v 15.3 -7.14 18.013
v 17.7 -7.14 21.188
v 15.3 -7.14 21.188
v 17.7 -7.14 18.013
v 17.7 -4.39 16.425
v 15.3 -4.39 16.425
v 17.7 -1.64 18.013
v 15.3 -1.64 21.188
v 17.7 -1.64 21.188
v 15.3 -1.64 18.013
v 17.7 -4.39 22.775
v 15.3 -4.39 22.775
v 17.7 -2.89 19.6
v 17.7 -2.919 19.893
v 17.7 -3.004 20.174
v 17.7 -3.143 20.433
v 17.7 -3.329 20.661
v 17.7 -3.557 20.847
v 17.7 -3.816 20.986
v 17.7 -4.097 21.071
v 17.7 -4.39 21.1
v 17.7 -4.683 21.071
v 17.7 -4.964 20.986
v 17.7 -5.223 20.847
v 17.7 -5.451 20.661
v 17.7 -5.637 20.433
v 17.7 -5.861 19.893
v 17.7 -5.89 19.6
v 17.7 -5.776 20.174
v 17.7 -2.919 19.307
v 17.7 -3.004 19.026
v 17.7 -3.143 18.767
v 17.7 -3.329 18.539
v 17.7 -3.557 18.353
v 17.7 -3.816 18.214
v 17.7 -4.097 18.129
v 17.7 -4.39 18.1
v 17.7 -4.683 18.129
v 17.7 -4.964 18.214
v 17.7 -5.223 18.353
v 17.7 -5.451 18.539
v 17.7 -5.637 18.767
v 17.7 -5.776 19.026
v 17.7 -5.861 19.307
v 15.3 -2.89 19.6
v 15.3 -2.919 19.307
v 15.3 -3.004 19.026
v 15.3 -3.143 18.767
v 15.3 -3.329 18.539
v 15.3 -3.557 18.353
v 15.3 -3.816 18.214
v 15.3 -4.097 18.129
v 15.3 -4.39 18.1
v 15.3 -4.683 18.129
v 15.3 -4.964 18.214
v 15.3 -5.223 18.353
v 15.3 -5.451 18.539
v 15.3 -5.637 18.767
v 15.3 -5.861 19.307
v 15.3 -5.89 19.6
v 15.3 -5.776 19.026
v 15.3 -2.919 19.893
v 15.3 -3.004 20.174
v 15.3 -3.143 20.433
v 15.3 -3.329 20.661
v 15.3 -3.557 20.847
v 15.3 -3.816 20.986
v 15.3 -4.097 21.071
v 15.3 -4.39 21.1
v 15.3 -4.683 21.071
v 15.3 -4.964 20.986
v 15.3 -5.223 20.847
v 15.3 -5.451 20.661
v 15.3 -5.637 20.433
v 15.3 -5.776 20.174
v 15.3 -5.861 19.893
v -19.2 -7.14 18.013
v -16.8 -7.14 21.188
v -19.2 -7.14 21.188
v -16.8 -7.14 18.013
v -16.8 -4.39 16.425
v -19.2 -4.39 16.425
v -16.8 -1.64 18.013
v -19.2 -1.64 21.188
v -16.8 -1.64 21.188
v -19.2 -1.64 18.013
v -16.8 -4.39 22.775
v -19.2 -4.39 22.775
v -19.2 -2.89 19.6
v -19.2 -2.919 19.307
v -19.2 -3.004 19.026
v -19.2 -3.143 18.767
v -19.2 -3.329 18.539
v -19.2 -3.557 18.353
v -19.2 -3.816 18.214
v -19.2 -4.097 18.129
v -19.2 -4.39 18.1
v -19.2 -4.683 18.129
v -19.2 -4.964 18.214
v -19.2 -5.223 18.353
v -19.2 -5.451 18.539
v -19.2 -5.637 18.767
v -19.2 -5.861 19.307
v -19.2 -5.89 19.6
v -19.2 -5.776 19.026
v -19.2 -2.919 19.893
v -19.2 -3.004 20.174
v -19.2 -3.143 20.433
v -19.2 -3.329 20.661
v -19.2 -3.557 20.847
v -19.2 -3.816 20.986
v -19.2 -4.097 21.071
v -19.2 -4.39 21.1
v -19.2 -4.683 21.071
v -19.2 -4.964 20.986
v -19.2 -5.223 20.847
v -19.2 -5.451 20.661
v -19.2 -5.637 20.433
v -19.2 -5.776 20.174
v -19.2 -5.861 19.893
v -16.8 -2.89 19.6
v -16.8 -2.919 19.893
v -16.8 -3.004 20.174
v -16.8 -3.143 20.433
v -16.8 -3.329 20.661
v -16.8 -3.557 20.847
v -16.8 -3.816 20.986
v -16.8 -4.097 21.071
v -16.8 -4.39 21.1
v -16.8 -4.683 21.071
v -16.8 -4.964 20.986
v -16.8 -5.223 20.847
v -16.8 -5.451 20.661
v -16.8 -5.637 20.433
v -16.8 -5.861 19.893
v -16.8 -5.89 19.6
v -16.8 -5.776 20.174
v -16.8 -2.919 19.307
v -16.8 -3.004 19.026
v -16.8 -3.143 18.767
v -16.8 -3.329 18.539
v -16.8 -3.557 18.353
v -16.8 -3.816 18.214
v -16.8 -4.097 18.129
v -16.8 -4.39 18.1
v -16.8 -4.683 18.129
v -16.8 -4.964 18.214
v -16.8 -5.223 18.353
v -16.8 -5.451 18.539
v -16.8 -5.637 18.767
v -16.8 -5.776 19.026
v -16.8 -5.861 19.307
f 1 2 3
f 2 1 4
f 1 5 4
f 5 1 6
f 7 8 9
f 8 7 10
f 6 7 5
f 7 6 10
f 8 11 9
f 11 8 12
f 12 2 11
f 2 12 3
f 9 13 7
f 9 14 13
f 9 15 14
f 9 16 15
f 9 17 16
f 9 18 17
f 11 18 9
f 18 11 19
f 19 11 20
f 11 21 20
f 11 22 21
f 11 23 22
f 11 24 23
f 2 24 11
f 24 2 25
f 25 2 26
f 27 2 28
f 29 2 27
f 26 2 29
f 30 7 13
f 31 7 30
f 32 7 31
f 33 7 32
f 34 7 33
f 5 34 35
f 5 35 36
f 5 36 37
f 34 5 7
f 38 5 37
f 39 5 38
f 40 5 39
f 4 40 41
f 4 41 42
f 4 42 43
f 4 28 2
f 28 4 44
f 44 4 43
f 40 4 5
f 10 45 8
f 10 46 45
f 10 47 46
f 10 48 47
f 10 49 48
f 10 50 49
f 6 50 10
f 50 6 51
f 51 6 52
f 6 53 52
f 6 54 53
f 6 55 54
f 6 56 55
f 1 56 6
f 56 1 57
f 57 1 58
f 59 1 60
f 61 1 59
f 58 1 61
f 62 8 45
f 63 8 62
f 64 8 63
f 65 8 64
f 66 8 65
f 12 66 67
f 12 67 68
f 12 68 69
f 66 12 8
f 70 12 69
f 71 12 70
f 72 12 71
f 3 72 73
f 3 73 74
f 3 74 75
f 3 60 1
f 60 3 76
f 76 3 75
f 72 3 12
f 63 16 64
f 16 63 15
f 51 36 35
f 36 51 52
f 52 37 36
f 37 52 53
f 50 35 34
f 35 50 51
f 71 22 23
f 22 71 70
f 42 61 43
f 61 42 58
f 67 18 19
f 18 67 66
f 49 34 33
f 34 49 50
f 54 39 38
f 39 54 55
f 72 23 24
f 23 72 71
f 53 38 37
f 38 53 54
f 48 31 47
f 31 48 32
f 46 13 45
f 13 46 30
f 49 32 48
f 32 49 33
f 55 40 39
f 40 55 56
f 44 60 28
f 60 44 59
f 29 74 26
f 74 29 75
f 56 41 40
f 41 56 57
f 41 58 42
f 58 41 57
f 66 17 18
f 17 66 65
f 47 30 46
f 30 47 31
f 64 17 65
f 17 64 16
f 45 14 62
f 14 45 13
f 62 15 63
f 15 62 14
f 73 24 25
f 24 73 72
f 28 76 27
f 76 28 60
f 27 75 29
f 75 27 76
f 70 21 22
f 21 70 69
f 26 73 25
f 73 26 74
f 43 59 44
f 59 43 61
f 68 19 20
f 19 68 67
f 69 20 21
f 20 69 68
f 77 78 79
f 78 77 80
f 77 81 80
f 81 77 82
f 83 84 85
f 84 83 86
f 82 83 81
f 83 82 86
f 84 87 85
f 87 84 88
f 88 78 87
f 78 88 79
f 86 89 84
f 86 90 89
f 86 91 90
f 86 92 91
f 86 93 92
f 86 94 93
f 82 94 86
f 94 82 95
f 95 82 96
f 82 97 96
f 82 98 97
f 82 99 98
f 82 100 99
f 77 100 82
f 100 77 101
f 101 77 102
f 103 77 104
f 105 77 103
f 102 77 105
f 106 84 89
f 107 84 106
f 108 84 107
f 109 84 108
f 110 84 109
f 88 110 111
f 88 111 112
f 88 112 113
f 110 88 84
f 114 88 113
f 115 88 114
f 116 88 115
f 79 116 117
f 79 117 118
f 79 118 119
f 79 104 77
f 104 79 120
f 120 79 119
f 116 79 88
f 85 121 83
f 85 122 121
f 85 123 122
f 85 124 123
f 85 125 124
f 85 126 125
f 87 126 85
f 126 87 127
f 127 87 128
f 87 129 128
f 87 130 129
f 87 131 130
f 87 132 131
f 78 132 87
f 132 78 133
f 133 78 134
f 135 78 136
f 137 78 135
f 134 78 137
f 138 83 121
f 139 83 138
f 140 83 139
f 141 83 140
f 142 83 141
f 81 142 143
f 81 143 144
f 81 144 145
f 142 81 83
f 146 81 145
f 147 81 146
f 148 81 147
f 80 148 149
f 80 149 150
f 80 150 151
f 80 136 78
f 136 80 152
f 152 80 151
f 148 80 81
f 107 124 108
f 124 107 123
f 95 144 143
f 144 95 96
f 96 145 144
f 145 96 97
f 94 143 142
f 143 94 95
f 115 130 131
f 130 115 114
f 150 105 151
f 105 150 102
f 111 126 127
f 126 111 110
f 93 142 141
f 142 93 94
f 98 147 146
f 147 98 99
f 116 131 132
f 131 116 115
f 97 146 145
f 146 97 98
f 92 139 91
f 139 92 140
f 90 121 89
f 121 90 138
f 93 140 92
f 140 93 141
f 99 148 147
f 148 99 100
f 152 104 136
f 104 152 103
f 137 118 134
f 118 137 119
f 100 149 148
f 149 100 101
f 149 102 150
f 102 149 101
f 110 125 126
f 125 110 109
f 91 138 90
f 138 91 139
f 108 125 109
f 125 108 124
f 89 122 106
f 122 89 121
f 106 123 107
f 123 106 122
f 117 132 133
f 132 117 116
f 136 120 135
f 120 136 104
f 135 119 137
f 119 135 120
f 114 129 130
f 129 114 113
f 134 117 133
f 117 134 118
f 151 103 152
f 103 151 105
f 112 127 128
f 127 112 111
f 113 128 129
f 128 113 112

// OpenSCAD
// color: #b9bec4
// variant: flat onepiece onepiece_flat
// material: metal
// PREVIEW ONLY (flat and one-piece variants: no adapter screw): M3 nuts of the duct screws, in the body's nut pockets.
$fn = 32;
module nut(d = 6.35, h = 2.4) difference() { cylinder(d = d, h = h, $fn = 6); translate([0, 0, -0.1]) cylinder(d = 3, h = h + 0.2); }

// duct screws: nut dropped into the body's pocket, resting on a corner (the body is not symmetric:
// the left pocket sits 1.5 mm further out than the right one)
for (p = [[1, 15.3], [-1, 16.8]]) mirror([p[0] < 0 ? 1 : 0, 0, 0])
    translate([p[1], -4.39, 19.6]) rotate([0, 90, 0]) nut();
